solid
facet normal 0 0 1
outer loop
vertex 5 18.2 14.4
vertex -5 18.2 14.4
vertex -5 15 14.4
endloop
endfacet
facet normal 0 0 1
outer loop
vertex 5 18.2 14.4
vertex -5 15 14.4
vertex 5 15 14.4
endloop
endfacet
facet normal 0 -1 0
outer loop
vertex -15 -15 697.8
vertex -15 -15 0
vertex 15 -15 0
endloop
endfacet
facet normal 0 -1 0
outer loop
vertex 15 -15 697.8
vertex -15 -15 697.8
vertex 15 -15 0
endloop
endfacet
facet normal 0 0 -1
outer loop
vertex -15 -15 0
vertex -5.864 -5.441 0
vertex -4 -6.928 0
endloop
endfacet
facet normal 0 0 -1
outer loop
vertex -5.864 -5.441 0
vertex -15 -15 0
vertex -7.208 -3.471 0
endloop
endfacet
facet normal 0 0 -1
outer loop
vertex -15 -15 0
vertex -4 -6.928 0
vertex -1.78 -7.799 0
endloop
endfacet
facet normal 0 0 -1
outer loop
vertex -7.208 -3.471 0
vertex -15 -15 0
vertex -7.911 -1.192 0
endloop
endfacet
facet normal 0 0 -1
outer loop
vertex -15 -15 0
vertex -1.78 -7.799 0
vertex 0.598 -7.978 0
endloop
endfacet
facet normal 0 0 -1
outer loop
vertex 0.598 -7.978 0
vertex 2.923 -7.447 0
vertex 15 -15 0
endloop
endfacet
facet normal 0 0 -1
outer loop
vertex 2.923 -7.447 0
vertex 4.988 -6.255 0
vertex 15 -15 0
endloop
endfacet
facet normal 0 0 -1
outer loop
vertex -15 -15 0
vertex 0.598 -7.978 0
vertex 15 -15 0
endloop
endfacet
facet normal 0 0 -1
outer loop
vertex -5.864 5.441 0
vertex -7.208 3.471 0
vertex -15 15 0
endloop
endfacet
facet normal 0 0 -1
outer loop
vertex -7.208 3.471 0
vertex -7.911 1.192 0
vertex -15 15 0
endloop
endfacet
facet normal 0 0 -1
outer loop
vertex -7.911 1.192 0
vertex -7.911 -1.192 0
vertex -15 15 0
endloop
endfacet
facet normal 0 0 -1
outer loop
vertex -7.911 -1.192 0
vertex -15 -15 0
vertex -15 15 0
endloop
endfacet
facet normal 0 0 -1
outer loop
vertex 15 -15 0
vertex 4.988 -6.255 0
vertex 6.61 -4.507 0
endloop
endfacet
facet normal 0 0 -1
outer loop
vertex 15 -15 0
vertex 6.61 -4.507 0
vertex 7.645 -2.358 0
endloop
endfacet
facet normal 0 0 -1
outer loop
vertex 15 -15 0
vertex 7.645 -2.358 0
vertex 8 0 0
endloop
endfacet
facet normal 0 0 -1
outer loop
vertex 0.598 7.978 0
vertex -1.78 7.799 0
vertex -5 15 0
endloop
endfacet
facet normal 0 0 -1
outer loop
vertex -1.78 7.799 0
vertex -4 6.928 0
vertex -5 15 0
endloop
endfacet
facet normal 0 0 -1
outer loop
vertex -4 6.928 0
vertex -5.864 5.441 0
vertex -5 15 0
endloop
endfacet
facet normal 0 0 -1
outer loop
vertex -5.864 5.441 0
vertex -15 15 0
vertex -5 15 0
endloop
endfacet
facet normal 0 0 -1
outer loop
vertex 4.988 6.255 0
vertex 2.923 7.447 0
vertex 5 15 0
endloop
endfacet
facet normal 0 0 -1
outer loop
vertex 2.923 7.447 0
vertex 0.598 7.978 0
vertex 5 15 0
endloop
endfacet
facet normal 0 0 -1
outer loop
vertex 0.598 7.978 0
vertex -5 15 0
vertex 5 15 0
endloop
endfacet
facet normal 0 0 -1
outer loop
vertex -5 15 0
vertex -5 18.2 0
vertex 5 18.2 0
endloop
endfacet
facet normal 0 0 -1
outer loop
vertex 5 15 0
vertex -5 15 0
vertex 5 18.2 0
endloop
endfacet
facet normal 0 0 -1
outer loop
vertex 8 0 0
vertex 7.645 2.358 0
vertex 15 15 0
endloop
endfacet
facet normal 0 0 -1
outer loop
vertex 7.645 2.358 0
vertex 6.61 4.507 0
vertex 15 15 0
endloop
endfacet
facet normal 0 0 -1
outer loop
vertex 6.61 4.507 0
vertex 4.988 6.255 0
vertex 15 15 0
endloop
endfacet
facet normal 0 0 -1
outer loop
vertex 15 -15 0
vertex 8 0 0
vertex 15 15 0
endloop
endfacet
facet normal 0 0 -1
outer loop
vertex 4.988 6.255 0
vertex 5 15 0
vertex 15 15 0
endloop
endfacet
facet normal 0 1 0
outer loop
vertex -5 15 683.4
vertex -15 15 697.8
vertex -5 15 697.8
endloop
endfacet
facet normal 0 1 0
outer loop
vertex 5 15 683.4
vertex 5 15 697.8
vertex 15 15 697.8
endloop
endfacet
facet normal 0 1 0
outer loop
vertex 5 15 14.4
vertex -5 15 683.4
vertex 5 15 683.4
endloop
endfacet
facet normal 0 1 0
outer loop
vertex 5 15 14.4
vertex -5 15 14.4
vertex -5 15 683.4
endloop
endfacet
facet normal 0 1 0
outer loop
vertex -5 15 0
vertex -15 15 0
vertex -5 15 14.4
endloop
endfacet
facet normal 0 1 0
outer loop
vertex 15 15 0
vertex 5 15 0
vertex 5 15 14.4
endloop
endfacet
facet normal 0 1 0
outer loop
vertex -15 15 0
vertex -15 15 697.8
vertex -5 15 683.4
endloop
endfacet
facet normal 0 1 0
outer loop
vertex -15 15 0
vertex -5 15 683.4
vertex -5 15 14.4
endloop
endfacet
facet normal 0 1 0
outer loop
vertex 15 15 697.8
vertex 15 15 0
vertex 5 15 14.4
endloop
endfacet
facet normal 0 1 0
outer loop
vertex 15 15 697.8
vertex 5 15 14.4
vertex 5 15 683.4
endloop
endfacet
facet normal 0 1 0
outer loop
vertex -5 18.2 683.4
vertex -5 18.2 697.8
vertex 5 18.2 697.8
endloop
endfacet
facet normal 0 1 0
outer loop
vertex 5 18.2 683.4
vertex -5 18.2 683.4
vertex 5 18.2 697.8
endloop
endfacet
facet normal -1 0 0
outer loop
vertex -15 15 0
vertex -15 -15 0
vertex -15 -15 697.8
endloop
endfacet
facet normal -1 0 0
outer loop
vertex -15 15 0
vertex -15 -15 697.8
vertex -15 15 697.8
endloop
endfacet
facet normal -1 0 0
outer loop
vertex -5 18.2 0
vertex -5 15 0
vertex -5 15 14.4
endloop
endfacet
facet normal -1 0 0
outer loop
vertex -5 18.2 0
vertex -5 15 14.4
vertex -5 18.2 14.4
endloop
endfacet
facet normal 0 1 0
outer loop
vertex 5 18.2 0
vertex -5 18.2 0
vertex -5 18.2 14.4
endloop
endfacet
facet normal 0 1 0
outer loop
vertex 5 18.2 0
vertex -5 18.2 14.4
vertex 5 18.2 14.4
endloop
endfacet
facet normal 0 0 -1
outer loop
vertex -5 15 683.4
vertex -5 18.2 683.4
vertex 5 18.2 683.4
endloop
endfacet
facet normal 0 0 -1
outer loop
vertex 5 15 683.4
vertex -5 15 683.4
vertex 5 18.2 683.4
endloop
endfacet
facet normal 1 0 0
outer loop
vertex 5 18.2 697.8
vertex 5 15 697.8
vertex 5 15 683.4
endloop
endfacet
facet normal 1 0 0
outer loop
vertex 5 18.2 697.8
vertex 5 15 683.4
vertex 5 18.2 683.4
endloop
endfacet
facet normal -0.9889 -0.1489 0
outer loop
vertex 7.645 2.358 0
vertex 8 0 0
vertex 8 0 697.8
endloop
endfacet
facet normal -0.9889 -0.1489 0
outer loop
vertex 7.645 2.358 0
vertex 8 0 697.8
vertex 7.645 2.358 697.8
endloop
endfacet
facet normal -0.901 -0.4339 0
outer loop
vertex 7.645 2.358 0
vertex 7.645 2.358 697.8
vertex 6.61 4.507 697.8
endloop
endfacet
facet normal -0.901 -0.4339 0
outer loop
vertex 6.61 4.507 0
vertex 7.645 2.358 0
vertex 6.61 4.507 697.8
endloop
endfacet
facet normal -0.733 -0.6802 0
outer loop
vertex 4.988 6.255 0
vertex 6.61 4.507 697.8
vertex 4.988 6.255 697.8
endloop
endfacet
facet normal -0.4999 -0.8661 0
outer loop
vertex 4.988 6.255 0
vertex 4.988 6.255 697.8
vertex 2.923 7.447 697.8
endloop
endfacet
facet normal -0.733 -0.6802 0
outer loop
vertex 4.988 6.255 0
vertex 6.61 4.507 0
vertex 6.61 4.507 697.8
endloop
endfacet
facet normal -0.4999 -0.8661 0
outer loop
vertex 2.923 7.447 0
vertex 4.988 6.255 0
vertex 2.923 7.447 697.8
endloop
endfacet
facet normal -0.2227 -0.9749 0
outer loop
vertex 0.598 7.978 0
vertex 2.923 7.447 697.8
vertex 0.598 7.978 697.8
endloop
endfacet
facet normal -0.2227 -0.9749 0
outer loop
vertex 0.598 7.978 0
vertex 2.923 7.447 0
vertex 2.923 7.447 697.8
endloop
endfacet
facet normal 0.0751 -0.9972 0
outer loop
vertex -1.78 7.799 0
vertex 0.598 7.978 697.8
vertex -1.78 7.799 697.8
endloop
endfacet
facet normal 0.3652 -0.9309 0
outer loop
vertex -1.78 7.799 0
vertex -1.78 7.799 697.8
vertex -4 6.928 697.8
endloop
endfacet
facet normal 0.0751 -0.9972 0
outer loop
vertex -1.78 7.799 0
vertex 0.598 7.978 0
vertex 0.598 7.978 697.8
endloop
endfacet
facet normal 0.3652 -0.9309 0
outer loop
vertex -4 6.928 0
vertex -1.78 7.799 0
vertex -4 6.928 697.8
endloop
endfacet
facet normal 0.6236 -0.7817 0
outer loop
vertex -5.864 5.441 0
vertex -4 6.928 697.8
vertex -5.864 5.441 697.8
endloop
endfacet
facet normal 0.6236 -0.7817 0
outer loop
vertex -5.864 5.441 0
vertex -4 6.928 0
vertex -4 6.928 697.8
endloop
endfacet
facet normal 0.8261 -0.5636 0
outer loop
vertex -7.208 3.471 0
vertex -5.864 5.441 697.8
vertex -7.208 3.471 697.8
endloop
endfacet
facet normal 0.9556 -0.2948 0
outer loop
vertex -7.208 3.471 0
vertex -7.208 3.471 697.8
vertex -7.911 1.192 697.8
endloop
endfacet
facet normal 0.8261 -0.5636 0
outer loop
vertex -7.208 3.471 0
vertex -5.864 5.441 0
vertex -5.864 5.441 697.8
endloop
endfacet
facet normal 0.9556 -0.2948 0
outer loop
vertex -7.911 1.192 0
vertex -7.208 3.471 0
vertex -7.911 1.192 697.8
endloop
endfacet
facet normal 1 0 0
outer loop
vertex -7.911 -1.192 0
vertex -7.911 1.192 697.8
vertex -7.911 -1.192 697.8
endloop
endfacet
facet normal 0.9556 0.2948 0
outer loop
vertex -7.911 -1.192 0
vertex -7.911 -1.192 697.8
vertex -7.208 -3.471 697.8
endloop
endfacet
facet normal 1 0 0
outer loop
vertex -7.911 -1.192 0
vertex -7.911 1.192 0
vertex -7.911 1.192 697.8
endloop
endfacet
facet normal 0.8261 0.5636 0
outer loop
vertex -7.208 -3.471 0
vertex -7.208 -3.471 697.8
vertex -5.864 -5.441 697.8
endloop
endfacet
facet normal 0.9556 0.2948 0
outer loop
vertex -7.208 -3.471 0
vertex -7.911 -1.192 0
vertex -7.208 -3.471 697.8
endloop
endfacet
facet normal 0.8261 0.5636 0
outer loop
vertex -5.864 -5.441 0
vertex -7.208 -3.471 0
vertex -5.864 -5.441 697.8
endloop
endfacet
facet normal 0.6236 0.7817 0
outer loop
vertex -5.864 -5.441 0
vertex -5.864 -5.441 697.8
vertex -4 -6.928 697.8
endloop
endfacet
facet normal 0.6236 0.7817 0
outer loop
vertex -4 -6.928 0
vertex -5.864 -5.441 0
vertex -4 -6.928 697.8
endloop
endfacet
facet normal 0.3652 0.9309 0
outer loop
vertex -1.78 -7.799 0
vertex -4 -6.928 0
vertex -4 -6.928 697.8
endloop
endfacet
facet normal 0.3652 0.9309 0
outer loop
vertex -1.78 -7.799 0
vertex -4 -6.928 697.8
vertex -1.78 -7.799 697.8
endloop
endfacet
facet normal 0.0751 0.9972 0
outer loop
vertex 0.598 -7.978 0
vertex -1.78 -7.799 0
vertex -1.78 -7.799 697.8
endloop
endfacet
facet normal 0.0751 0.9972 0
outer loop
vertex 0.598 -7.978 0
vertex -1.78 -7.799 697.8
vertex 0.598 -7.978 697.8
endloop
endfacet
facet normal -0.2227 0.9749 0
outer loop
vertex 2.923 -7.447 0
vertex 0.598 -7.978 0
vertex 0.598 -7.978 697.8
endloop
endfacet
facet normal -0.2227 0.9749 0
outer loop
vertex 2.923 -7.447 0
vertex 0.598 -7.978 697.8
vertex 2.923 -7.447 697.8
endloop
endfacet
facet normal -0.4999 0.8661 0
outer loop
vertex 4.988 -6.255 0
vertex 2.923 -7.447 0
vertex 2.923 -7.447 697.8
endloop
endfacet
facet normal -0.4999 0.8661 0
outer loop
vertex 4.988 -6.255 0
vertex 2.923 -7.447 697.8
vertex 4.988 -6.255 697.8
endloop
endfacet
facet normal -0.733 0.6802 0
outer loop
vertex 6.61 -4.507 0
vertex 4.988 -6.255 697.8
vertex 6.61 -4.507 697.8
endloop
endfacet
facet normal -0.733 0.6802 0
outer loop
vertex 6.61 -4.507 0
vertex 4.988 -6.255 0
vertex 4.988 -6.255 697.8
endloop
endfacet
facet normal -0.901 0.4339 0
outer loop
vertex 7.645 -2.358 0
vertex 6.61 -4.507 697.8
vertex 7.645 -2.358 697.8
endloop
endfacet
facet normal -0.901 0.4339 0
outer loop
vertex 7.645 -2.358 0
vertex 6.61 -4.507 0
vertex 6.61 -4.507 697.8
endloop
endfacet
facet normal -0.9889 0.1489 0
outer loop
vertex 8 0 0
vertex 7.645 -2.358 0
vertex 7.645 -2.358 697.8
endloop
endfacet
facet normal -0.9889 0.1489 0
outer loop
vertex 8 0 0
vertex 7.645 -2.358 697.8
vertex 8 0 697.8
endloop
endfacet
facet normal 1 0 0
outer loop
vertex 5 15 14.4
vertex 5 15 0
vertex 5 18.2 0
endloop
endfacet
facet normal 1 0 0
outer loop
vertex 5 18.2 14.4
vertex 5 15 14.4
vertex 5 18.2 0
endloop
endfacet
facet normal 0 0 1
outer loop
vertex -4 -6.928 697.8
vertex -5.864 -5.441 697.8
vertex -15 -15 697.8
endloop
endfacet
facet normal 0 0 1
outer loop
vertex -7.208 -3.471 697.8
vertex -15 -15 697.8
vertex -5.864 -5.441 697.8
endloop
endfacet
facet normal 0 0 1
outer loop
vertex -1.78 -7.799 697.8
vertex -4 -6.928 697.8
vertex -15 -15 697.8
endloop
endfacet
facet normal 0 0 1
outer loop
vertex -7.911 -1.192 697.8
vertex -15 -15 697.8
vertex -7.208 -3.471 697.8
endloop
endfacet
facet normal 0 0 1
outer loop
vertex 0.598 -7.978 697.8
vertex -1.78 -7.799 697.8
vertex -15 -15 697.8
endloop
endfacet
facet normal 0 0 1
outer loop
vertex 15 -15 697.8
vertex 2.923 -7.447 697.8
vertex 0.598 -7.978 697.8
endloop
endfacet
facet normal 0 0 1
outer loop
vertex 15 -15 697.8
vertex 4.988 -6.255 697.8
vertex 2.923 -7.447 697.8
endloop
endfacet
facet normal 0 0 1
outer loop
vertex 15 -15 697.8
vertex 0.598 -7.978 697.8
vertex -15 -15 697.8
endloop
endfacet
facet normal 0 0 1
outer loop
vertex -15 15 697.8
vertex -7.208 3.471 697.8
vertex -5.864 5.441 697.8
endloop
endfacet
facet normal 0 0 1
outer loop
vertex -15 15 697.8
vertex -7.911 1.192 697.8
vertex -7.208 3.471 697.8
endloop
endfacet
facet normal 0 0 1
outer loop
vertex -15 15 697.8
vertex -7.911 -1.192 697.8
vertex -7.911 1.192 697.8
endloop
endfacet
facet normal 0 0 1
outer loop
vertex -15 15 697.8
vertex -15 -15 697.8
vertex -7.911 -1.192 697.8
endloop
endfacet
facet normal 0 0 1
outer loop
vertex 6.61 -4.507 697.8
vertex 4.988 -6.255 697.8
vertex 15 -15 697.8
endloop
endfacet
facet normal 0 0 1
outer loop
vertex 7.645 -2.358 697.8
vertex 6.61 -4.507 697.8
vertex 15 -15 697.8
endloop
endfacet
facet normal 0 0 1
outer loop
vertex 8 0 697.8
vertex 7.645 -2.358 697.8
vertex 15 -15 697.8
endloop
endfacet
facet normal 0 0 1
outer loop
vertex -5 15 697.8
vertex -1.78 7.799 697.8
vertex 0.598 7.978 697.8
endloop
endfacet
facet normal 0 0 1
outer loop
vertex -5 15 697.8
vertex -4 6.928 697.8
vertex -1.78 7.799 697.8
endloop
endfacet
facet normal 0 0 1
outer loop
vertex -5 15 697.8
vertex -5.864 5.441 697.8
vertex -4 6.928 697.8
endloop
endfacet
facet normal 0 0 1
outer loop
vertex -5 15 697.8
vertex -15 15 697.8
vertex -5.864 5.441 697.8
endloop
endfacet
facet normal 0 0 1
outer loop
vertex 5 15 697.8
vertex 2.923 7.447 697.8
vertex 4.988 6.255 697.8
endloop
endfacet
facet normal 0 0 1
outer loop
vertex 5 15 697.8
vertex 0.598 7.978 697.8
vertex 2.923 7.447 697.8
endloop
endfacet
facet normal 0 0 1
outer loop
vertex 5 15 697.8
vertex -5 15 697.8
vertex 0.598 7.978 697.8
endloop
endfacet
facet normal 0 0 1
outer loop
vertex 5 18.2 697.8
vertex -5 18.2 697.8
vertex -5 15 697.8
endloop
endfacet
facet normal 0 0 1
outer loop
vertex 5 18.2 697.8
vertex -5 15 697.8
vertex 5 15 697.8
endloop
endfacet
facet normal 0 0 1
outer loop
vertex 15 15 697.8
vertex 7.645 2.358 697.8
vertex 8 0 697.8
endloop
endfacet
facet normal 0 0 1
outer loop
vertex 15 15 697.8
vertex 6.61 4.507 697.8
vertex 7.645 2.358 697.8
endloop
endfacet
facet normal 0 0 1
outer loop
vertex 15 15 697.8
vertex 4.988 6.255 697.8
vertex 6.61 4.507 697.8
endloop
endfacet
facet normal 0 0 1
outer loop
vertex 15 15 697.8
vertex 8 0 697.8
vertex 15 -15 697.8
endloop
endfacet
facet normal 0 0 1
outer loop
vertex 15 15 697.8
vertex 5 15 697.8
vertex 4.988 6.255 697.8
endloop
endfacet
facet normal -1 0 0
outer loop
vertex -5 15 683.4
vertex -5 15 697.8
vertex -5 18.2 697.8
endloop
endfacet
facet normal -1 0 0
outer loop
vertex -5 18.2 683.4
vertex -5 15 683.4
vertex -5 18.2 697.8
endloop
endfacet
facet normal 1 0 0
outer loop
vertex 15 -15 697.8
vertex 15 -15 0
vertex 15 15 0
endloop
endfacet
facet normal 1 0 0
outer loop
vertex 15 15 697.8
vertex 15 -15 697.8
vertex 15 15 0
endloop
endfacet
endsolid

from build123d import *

# Parameters (mm, degrees)
SKETCH_1_W      = 30
SKETCH_1_H      = 30
SKETCH_1_R      = 8
EXTRUDE_1_DEPTH = 697.8
SKETCH_2_W      = 10
SKETCH_2_H      = 3.2
EXTRUDE_2_DEPTH = 14.4


with BuildPart() as part:
    # 草图1 → 凸台-拉伸1 (new body)
    with BuildSketch(Plane.XY):
        Rectangle(SKETCH_1_W, SKETCH_1_H)
        Circle(SKETCH_1_R, mode=Mode.SUBTRACT)
    extrude(amount=EXTRUDE_1_DEPTH)

    # 草图2 → 凸台-拉伸2 (add)
    with BuildSketch(Plane.XY.offset(697.8)):
        with Locations((0, 16.6)):
            Rectangle(SKETCH_2_W, SKETCH_2_H)
    extrude_2 = extrude(amount=-EXTRUDE_2_DEPTH)

    # 镜向1: 凸台-拉伸2 across plane
    add(extrude_2.mirror(Plane.XY.offset(348.9)))


solid = part.part
